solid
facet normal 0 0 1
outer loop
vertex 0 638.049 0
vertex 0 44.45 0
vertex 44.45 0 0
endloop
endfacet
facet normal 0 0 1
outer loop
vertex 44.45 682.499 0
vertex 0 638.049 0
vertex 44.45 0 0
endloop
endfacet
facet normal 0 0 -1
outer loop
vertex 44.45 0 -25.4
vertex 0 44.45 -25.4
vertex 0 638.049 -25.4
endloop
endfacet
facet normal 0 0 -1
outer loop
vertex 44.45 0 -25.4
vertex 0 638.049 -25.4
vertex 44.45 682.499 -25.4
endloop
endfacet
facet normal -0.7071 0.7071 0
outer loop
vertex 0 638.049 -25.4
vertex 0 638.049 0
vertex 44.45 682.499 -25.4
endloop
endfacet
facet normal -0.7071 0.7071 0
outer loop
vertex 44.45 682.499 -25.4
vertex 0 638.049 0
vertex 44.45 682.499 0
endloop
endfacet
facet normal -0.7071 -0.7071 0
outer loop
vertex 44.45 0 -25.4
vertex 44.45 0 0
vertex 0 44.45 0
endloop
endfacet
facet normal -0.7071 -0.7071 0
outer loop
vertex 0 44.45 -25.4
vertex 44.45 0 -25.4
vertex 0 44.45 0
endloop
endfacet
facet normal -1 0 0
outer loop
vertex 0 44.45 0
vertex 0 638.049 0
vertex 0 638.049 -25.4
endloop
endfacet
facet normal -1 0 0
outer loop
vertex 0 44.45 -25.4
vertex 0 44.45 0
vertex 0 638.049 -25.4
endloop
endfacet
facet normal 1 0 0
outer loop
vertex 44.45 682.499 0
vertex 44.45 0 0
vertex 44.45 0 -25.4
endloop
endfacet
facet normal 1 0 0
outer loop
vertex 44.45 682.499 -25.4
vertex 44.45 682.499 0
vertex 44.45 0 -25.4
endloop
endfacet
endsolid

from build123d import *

# Parameters (mm, degrees)
SKETCH1_W           = 25.4
SKETCH1_H           = 682.499465201
BOSS_EXTRUDE1_DEPTH = 44.45
CUT_EXTRUDE1_DEPTH  = 44.45
CUT_EXTRUDE2_DEPTH  = 44.45


with BuildPart() as part:
    # Sketch1 → Boss-Extrude1 (new body)
    with BuildSketch(Plane(origin=(0, 0, 0), x_dir=(0, 0, -1), z_dir=(1, 0, 0))):
        with Locations((12.7, 341.249732601)):
            Rectangle(SKETCH1_W, SKETCH1_H)
    extrude(amount=BOSS_EXTRUDE1_DEPTH)

    # Sketch2 → Cut-Extrude1 (cut)
    with BuildSketch(Plane.XY):
        Polygon((44.45, 0), (0, 44.45), (0, 0), align=None)
    extrude(amount=-CUT_EXTRUDE1_DEPTH, mode=Mode.SUBTRACT)

    # Sketch3 → Cut-Extrude2 (cut)
    with BuildSketch(Plane.XY):
        Polygon((0, 638.049465201), (44.45, 682.499465201), (0, 682.499465201), align=None)
    extrude(amount=-CUT_EXTRUDE2_DEPTH, mode=Mode.SUBTRACT)


solid = part.part
